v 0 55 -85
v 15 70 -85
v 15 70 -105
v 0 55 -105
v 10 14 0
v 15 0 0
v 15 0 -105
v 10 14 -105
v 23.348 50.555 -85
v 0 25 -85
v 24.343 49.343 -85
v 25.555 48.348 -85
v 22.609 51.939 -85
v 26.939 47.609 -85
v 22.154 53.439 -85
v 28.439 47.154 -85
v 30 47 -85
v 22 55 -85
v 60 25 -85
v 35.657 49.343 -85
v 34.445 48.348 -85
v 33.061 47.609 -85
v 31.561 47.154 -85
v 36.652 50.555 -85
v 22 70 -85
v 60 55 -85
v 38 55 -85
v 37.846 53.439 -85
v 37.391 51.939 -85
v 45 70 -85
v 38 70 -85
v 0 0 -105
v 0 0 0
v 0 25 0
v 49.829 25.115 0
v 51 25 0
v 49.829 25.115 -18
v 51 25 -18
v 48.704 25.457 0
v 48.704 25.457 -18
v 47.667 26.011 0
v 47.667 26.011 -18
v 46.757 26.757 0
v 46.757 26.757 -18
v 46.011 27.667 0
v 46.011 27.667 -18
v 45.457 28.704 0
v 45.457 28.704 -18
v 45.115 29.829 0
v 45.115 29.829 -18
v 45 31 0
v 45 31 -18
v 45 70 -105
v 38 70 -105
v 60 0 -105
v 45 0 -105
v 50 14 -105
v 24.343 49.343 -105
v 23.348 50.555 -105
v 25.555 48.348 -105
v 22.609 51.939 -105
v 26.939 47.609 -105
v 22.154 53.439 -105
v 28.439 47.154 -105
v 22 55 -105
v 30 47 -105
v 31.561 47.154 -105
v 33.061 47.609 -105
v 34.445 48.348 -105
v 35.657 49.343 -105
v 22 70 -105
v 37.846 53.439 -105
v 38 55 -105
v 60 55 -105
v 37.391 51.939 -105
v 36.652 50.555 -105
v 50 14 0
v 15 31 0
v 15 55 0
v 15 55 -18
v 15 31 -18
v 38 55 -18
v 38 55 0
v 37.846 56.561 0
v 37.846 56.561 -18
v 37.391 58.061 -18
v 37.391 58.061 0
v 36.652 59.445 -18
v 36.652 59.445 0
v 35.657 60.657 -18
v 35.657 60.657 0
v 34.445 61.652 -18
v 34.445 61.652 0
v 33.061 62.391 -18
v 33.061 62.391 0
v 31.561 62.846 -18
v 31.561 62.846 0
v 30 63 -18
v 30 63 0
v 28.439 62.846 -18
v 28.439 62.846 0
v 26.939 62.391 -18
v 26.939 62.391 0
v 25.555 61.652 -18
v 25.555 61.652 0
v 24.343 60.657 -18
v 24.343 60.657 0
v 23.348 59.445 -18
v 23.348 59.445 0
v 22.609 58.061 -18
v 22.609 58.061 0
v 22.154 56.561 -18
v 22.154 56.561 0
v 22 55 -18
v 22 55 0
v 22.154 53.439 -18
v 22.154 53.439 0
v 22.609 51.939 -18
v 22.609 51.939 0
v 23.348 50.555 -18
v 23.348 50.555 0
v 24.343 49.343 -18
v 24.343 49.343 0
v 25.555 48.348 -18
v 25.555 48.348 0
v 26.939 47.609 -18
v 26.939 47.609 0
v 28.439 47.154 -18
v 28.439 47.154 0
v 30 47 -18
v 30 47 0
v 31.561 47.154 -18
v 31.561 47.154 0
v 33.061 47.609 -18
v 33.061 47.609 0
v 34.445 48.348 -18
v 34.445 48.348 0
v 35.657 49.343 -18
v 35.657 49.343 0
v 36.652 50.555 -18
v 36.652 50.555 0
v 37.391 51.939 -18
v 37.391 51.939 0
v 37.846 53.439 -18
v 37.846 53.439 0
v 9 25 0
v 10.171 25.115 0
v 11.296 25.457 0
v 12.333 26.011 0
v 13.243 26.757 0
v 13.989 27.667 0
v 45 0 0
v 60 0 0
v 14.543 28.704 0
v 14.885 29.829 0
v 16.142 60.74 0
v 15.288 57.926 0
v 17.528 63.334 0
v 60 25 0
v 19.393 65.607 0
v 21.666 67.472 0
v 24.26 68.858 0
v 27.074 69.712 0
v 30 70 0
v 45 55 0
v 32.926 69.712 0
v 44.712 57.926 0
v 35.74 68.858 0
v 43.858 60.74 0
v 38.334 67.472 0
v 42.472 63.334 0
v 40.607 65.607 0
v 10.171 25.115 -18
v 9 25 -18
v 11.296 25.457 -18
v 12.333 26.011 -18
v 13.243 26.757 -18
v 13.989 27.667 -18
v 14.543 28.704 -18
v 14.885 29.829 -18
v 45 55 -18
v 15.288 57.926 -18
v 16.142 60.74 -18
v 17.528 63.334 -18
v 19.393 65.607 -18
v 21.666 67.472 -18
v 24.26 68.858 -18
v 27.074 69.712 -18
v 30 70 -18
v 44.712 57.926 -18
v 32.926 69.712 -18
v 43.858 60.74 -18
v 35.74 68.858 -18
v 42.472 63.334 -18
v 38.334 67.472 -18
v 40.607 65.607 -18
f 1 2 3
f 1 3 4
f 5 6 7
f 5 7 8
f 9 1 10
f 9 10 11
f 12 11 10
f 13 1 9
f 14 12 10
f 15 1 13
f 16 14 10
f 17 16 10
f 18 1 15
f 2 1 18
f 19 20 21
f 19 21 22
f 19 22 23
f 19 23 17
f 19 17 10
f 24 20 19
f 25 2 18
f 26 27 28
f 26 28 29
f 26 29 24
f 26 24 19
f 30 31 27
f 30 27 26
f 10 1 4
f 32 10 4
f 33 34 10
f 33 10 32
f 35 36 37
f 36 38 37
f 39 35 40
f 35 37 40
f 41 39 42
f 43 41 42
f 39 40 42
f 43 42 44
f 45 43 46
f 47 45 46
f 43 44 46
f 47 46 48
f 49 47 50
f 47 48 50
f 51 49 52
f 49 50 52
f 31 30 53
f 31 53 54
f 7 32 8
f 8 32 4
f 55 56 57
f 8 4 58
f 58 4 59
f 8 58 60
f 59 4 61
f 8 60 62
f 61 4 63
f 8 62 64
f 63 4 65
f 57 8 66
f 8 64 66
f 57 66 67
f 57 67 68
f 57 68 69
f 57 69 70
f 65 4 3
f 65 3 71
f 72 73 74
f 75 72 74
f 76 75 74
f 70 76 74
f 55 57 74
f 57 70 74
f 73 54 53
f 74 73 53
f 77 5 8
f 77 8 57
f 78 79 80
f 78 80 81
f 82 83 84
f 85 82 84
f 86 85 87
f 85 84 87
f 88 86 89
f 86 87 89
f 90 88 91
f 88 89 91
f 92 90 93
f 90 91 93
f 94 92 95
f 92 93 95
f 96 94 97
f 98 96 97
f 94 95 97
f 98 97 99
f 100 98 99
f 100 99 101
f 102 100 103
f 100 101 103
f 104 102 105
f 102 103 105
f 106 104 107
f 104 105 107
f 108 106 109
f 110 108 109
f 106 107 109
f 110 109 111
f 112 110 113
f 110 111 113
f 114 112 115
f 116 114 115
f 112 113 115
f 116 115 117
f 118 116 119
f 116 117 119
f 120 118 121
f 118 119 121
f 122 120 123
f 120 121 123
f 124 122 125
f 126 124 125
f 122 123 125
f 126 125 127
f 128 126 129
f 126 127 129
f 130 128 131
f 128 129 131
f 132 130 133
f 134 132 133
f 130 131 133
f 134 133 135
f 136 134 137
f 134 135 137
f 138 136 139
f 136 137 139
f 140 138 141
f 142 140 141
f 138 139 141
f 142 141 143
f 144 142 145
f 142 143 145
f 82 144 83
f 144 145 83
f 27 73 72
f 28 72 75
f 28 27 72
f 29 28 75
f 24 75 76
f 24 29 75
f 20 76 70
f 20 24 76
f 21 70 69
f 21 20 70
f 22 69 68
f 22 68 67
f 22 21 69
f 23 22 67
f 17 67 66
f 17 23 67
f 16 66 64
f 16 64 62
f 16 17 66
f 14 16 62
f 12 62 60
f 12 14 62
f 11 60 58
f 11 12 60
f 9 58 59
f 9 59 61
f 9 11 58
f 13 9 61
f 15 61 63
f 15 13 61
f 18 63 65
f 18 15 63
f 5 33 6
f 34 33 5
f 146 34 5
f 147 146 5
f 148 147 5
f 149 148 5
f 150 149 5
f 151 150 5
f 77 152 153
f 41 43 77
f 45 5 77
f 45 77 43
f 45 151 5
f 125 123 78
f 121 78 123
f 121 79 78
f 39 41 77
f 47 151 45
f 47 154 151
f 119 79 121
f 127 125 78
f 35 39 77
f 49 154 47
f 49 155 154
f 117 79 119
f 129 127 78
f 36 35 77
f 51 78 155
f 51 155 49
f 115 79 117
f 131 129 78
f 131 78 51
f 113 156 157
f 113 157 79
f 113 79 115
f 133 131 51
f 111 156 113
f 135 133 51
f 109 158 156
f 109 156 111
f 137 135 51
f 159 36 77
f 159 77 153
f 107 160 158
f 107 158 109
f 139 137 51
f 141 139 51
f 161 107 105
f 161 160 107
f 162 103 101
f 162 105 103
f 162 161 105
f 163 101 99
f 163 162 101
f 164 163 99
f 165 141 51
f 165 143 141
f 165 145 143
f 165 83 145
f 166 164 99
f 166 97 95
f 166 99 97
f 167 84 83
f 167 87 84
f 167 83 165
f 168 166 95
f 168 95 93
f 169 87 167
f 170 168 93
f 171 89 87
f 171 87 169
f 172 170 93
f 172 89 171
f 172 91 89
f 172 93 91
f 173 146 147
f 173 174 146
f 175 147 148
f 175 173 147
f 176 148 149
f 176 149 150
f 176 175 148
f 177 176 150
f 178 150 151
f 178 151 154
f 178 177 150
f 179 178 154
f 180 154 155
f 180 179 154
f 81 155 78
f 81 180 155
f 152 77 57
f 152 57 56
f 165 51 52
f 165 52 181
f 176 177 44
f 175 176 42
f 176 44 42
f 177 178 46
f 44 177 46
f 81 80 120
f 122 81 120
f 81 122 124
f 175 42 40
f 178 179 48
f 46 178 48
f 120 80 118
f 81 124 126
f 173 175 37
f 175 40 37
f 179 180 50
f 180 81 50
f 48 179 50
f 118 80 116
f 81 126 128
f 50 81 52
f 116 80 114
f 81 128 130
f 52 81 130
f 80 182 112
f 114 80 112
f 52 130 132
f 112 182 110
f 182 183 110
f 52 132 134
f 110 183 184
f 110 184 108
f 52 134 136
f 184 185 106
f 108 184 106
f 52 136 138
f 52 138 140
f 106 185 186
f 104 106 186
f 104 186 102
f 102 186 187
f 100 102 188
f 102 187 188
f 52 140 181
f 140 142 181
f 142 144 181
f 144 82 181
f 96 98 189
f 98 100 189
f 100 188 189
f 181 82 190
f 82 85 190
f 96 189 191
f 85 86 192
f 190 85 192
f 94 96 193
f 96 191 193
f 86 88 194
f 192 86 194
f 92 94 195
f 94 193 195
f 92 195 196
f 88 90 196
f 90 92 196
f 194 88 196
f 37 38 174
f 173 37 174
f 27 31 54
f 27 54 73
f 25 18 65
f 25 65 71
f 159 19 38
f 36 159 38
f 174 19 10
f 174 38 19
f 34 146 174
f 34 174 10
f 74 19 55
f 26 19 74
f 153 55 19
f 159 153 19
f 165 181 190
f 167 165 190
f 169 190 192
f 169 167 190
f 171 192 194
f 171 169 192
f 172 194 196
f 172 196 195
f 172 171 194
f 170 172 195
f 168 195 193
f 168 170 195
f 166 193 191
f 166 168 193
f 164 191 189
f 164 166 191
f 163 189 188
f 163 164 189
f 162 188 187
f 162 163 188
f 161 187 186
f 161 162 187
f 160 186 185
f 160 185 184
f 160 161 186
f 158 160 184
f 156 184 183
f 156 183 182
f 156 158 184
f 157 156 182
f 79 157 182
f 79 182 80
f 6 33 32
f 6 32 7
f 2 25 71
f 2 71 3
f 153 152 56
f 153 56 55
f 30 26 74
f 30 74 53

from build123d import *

# Parameters (mm, degrees)
BOSS_EXTRUDE1_DEPTH = 105
SKETCH2_R           = 8
BOSS_EXTRUDE2_DEPTH = 18
FILLET1_R           = 6
BOSS_EXTRUDE3_START = -20
BOSS_EXTRUDE3_DEPTH = 20


with BuildPart() as part:
    # Sketch1 → Boss-Extrude1 (new body)
    with BuildSketch(Plane.XY):
        Polygon((45, 0), (60, 0), (60, 25), (0, 25), (0, 0), (15, 0), (10, 14), (50, 14), align=None)
    extrude(amount=-BOSS_EXTRUDE1_DEPTH)

    # Sketch2 → Boss-Extrude2 (add)
    with BuildSketch(Plane.XY):
        with BuildLine():
            Line((15, 55), (15, 25))
            Line((15, 25), (45, 25))
            Line((45, 25), (45, 55))
            ThreePointArc((45, 55), (30, 70), (15, 55))
        make_face()
        with Locations((30, 55)):
            Circle(SKETCH2_R, mode=Mode.SUBTRACT)
    extrude(amount=-BOSS_EXTRUDE2_DEPTH)

    # Fillet1
    fillet1_edges = [part.edges().sort_by_distance(p)[0] for p in [
        (45, 25, -9),
        (15, 25, -9),
    ]]
    fillet(fillet1_edges, radius=FILLET1_R)

    # Sketch3 → Boss-Extrude3 (add)
    with BuildSketch(Plane(origin=(0, 0, -105), x_dir=(-1, 0, 0), z_dir=(0, 0, -1)).offset(BOSS_EXTRUDE3_START)):
        with BuildLine():
            Line((-60, 55), (-45, 70))
            Line((-45, 70), (-38, 70))
            Line((-38, 70), (-38, 55))
            ThreePointArc((-38, 55), (-30, 47), (-22, 55))
            Line((-22, 55), (-22, 70))
            Line((-22, 70), (-15, 70))
            Line((-15, 70), (0, 55))
            Line((0, 55), (0, 25))
            Line((0, 25), (-60, 25))
            Line((-60, 25), (-60, 55))
        make_face()
    extrude(amount=BOSS_EXTRUDE3_DEPTH)


solid = part.part
